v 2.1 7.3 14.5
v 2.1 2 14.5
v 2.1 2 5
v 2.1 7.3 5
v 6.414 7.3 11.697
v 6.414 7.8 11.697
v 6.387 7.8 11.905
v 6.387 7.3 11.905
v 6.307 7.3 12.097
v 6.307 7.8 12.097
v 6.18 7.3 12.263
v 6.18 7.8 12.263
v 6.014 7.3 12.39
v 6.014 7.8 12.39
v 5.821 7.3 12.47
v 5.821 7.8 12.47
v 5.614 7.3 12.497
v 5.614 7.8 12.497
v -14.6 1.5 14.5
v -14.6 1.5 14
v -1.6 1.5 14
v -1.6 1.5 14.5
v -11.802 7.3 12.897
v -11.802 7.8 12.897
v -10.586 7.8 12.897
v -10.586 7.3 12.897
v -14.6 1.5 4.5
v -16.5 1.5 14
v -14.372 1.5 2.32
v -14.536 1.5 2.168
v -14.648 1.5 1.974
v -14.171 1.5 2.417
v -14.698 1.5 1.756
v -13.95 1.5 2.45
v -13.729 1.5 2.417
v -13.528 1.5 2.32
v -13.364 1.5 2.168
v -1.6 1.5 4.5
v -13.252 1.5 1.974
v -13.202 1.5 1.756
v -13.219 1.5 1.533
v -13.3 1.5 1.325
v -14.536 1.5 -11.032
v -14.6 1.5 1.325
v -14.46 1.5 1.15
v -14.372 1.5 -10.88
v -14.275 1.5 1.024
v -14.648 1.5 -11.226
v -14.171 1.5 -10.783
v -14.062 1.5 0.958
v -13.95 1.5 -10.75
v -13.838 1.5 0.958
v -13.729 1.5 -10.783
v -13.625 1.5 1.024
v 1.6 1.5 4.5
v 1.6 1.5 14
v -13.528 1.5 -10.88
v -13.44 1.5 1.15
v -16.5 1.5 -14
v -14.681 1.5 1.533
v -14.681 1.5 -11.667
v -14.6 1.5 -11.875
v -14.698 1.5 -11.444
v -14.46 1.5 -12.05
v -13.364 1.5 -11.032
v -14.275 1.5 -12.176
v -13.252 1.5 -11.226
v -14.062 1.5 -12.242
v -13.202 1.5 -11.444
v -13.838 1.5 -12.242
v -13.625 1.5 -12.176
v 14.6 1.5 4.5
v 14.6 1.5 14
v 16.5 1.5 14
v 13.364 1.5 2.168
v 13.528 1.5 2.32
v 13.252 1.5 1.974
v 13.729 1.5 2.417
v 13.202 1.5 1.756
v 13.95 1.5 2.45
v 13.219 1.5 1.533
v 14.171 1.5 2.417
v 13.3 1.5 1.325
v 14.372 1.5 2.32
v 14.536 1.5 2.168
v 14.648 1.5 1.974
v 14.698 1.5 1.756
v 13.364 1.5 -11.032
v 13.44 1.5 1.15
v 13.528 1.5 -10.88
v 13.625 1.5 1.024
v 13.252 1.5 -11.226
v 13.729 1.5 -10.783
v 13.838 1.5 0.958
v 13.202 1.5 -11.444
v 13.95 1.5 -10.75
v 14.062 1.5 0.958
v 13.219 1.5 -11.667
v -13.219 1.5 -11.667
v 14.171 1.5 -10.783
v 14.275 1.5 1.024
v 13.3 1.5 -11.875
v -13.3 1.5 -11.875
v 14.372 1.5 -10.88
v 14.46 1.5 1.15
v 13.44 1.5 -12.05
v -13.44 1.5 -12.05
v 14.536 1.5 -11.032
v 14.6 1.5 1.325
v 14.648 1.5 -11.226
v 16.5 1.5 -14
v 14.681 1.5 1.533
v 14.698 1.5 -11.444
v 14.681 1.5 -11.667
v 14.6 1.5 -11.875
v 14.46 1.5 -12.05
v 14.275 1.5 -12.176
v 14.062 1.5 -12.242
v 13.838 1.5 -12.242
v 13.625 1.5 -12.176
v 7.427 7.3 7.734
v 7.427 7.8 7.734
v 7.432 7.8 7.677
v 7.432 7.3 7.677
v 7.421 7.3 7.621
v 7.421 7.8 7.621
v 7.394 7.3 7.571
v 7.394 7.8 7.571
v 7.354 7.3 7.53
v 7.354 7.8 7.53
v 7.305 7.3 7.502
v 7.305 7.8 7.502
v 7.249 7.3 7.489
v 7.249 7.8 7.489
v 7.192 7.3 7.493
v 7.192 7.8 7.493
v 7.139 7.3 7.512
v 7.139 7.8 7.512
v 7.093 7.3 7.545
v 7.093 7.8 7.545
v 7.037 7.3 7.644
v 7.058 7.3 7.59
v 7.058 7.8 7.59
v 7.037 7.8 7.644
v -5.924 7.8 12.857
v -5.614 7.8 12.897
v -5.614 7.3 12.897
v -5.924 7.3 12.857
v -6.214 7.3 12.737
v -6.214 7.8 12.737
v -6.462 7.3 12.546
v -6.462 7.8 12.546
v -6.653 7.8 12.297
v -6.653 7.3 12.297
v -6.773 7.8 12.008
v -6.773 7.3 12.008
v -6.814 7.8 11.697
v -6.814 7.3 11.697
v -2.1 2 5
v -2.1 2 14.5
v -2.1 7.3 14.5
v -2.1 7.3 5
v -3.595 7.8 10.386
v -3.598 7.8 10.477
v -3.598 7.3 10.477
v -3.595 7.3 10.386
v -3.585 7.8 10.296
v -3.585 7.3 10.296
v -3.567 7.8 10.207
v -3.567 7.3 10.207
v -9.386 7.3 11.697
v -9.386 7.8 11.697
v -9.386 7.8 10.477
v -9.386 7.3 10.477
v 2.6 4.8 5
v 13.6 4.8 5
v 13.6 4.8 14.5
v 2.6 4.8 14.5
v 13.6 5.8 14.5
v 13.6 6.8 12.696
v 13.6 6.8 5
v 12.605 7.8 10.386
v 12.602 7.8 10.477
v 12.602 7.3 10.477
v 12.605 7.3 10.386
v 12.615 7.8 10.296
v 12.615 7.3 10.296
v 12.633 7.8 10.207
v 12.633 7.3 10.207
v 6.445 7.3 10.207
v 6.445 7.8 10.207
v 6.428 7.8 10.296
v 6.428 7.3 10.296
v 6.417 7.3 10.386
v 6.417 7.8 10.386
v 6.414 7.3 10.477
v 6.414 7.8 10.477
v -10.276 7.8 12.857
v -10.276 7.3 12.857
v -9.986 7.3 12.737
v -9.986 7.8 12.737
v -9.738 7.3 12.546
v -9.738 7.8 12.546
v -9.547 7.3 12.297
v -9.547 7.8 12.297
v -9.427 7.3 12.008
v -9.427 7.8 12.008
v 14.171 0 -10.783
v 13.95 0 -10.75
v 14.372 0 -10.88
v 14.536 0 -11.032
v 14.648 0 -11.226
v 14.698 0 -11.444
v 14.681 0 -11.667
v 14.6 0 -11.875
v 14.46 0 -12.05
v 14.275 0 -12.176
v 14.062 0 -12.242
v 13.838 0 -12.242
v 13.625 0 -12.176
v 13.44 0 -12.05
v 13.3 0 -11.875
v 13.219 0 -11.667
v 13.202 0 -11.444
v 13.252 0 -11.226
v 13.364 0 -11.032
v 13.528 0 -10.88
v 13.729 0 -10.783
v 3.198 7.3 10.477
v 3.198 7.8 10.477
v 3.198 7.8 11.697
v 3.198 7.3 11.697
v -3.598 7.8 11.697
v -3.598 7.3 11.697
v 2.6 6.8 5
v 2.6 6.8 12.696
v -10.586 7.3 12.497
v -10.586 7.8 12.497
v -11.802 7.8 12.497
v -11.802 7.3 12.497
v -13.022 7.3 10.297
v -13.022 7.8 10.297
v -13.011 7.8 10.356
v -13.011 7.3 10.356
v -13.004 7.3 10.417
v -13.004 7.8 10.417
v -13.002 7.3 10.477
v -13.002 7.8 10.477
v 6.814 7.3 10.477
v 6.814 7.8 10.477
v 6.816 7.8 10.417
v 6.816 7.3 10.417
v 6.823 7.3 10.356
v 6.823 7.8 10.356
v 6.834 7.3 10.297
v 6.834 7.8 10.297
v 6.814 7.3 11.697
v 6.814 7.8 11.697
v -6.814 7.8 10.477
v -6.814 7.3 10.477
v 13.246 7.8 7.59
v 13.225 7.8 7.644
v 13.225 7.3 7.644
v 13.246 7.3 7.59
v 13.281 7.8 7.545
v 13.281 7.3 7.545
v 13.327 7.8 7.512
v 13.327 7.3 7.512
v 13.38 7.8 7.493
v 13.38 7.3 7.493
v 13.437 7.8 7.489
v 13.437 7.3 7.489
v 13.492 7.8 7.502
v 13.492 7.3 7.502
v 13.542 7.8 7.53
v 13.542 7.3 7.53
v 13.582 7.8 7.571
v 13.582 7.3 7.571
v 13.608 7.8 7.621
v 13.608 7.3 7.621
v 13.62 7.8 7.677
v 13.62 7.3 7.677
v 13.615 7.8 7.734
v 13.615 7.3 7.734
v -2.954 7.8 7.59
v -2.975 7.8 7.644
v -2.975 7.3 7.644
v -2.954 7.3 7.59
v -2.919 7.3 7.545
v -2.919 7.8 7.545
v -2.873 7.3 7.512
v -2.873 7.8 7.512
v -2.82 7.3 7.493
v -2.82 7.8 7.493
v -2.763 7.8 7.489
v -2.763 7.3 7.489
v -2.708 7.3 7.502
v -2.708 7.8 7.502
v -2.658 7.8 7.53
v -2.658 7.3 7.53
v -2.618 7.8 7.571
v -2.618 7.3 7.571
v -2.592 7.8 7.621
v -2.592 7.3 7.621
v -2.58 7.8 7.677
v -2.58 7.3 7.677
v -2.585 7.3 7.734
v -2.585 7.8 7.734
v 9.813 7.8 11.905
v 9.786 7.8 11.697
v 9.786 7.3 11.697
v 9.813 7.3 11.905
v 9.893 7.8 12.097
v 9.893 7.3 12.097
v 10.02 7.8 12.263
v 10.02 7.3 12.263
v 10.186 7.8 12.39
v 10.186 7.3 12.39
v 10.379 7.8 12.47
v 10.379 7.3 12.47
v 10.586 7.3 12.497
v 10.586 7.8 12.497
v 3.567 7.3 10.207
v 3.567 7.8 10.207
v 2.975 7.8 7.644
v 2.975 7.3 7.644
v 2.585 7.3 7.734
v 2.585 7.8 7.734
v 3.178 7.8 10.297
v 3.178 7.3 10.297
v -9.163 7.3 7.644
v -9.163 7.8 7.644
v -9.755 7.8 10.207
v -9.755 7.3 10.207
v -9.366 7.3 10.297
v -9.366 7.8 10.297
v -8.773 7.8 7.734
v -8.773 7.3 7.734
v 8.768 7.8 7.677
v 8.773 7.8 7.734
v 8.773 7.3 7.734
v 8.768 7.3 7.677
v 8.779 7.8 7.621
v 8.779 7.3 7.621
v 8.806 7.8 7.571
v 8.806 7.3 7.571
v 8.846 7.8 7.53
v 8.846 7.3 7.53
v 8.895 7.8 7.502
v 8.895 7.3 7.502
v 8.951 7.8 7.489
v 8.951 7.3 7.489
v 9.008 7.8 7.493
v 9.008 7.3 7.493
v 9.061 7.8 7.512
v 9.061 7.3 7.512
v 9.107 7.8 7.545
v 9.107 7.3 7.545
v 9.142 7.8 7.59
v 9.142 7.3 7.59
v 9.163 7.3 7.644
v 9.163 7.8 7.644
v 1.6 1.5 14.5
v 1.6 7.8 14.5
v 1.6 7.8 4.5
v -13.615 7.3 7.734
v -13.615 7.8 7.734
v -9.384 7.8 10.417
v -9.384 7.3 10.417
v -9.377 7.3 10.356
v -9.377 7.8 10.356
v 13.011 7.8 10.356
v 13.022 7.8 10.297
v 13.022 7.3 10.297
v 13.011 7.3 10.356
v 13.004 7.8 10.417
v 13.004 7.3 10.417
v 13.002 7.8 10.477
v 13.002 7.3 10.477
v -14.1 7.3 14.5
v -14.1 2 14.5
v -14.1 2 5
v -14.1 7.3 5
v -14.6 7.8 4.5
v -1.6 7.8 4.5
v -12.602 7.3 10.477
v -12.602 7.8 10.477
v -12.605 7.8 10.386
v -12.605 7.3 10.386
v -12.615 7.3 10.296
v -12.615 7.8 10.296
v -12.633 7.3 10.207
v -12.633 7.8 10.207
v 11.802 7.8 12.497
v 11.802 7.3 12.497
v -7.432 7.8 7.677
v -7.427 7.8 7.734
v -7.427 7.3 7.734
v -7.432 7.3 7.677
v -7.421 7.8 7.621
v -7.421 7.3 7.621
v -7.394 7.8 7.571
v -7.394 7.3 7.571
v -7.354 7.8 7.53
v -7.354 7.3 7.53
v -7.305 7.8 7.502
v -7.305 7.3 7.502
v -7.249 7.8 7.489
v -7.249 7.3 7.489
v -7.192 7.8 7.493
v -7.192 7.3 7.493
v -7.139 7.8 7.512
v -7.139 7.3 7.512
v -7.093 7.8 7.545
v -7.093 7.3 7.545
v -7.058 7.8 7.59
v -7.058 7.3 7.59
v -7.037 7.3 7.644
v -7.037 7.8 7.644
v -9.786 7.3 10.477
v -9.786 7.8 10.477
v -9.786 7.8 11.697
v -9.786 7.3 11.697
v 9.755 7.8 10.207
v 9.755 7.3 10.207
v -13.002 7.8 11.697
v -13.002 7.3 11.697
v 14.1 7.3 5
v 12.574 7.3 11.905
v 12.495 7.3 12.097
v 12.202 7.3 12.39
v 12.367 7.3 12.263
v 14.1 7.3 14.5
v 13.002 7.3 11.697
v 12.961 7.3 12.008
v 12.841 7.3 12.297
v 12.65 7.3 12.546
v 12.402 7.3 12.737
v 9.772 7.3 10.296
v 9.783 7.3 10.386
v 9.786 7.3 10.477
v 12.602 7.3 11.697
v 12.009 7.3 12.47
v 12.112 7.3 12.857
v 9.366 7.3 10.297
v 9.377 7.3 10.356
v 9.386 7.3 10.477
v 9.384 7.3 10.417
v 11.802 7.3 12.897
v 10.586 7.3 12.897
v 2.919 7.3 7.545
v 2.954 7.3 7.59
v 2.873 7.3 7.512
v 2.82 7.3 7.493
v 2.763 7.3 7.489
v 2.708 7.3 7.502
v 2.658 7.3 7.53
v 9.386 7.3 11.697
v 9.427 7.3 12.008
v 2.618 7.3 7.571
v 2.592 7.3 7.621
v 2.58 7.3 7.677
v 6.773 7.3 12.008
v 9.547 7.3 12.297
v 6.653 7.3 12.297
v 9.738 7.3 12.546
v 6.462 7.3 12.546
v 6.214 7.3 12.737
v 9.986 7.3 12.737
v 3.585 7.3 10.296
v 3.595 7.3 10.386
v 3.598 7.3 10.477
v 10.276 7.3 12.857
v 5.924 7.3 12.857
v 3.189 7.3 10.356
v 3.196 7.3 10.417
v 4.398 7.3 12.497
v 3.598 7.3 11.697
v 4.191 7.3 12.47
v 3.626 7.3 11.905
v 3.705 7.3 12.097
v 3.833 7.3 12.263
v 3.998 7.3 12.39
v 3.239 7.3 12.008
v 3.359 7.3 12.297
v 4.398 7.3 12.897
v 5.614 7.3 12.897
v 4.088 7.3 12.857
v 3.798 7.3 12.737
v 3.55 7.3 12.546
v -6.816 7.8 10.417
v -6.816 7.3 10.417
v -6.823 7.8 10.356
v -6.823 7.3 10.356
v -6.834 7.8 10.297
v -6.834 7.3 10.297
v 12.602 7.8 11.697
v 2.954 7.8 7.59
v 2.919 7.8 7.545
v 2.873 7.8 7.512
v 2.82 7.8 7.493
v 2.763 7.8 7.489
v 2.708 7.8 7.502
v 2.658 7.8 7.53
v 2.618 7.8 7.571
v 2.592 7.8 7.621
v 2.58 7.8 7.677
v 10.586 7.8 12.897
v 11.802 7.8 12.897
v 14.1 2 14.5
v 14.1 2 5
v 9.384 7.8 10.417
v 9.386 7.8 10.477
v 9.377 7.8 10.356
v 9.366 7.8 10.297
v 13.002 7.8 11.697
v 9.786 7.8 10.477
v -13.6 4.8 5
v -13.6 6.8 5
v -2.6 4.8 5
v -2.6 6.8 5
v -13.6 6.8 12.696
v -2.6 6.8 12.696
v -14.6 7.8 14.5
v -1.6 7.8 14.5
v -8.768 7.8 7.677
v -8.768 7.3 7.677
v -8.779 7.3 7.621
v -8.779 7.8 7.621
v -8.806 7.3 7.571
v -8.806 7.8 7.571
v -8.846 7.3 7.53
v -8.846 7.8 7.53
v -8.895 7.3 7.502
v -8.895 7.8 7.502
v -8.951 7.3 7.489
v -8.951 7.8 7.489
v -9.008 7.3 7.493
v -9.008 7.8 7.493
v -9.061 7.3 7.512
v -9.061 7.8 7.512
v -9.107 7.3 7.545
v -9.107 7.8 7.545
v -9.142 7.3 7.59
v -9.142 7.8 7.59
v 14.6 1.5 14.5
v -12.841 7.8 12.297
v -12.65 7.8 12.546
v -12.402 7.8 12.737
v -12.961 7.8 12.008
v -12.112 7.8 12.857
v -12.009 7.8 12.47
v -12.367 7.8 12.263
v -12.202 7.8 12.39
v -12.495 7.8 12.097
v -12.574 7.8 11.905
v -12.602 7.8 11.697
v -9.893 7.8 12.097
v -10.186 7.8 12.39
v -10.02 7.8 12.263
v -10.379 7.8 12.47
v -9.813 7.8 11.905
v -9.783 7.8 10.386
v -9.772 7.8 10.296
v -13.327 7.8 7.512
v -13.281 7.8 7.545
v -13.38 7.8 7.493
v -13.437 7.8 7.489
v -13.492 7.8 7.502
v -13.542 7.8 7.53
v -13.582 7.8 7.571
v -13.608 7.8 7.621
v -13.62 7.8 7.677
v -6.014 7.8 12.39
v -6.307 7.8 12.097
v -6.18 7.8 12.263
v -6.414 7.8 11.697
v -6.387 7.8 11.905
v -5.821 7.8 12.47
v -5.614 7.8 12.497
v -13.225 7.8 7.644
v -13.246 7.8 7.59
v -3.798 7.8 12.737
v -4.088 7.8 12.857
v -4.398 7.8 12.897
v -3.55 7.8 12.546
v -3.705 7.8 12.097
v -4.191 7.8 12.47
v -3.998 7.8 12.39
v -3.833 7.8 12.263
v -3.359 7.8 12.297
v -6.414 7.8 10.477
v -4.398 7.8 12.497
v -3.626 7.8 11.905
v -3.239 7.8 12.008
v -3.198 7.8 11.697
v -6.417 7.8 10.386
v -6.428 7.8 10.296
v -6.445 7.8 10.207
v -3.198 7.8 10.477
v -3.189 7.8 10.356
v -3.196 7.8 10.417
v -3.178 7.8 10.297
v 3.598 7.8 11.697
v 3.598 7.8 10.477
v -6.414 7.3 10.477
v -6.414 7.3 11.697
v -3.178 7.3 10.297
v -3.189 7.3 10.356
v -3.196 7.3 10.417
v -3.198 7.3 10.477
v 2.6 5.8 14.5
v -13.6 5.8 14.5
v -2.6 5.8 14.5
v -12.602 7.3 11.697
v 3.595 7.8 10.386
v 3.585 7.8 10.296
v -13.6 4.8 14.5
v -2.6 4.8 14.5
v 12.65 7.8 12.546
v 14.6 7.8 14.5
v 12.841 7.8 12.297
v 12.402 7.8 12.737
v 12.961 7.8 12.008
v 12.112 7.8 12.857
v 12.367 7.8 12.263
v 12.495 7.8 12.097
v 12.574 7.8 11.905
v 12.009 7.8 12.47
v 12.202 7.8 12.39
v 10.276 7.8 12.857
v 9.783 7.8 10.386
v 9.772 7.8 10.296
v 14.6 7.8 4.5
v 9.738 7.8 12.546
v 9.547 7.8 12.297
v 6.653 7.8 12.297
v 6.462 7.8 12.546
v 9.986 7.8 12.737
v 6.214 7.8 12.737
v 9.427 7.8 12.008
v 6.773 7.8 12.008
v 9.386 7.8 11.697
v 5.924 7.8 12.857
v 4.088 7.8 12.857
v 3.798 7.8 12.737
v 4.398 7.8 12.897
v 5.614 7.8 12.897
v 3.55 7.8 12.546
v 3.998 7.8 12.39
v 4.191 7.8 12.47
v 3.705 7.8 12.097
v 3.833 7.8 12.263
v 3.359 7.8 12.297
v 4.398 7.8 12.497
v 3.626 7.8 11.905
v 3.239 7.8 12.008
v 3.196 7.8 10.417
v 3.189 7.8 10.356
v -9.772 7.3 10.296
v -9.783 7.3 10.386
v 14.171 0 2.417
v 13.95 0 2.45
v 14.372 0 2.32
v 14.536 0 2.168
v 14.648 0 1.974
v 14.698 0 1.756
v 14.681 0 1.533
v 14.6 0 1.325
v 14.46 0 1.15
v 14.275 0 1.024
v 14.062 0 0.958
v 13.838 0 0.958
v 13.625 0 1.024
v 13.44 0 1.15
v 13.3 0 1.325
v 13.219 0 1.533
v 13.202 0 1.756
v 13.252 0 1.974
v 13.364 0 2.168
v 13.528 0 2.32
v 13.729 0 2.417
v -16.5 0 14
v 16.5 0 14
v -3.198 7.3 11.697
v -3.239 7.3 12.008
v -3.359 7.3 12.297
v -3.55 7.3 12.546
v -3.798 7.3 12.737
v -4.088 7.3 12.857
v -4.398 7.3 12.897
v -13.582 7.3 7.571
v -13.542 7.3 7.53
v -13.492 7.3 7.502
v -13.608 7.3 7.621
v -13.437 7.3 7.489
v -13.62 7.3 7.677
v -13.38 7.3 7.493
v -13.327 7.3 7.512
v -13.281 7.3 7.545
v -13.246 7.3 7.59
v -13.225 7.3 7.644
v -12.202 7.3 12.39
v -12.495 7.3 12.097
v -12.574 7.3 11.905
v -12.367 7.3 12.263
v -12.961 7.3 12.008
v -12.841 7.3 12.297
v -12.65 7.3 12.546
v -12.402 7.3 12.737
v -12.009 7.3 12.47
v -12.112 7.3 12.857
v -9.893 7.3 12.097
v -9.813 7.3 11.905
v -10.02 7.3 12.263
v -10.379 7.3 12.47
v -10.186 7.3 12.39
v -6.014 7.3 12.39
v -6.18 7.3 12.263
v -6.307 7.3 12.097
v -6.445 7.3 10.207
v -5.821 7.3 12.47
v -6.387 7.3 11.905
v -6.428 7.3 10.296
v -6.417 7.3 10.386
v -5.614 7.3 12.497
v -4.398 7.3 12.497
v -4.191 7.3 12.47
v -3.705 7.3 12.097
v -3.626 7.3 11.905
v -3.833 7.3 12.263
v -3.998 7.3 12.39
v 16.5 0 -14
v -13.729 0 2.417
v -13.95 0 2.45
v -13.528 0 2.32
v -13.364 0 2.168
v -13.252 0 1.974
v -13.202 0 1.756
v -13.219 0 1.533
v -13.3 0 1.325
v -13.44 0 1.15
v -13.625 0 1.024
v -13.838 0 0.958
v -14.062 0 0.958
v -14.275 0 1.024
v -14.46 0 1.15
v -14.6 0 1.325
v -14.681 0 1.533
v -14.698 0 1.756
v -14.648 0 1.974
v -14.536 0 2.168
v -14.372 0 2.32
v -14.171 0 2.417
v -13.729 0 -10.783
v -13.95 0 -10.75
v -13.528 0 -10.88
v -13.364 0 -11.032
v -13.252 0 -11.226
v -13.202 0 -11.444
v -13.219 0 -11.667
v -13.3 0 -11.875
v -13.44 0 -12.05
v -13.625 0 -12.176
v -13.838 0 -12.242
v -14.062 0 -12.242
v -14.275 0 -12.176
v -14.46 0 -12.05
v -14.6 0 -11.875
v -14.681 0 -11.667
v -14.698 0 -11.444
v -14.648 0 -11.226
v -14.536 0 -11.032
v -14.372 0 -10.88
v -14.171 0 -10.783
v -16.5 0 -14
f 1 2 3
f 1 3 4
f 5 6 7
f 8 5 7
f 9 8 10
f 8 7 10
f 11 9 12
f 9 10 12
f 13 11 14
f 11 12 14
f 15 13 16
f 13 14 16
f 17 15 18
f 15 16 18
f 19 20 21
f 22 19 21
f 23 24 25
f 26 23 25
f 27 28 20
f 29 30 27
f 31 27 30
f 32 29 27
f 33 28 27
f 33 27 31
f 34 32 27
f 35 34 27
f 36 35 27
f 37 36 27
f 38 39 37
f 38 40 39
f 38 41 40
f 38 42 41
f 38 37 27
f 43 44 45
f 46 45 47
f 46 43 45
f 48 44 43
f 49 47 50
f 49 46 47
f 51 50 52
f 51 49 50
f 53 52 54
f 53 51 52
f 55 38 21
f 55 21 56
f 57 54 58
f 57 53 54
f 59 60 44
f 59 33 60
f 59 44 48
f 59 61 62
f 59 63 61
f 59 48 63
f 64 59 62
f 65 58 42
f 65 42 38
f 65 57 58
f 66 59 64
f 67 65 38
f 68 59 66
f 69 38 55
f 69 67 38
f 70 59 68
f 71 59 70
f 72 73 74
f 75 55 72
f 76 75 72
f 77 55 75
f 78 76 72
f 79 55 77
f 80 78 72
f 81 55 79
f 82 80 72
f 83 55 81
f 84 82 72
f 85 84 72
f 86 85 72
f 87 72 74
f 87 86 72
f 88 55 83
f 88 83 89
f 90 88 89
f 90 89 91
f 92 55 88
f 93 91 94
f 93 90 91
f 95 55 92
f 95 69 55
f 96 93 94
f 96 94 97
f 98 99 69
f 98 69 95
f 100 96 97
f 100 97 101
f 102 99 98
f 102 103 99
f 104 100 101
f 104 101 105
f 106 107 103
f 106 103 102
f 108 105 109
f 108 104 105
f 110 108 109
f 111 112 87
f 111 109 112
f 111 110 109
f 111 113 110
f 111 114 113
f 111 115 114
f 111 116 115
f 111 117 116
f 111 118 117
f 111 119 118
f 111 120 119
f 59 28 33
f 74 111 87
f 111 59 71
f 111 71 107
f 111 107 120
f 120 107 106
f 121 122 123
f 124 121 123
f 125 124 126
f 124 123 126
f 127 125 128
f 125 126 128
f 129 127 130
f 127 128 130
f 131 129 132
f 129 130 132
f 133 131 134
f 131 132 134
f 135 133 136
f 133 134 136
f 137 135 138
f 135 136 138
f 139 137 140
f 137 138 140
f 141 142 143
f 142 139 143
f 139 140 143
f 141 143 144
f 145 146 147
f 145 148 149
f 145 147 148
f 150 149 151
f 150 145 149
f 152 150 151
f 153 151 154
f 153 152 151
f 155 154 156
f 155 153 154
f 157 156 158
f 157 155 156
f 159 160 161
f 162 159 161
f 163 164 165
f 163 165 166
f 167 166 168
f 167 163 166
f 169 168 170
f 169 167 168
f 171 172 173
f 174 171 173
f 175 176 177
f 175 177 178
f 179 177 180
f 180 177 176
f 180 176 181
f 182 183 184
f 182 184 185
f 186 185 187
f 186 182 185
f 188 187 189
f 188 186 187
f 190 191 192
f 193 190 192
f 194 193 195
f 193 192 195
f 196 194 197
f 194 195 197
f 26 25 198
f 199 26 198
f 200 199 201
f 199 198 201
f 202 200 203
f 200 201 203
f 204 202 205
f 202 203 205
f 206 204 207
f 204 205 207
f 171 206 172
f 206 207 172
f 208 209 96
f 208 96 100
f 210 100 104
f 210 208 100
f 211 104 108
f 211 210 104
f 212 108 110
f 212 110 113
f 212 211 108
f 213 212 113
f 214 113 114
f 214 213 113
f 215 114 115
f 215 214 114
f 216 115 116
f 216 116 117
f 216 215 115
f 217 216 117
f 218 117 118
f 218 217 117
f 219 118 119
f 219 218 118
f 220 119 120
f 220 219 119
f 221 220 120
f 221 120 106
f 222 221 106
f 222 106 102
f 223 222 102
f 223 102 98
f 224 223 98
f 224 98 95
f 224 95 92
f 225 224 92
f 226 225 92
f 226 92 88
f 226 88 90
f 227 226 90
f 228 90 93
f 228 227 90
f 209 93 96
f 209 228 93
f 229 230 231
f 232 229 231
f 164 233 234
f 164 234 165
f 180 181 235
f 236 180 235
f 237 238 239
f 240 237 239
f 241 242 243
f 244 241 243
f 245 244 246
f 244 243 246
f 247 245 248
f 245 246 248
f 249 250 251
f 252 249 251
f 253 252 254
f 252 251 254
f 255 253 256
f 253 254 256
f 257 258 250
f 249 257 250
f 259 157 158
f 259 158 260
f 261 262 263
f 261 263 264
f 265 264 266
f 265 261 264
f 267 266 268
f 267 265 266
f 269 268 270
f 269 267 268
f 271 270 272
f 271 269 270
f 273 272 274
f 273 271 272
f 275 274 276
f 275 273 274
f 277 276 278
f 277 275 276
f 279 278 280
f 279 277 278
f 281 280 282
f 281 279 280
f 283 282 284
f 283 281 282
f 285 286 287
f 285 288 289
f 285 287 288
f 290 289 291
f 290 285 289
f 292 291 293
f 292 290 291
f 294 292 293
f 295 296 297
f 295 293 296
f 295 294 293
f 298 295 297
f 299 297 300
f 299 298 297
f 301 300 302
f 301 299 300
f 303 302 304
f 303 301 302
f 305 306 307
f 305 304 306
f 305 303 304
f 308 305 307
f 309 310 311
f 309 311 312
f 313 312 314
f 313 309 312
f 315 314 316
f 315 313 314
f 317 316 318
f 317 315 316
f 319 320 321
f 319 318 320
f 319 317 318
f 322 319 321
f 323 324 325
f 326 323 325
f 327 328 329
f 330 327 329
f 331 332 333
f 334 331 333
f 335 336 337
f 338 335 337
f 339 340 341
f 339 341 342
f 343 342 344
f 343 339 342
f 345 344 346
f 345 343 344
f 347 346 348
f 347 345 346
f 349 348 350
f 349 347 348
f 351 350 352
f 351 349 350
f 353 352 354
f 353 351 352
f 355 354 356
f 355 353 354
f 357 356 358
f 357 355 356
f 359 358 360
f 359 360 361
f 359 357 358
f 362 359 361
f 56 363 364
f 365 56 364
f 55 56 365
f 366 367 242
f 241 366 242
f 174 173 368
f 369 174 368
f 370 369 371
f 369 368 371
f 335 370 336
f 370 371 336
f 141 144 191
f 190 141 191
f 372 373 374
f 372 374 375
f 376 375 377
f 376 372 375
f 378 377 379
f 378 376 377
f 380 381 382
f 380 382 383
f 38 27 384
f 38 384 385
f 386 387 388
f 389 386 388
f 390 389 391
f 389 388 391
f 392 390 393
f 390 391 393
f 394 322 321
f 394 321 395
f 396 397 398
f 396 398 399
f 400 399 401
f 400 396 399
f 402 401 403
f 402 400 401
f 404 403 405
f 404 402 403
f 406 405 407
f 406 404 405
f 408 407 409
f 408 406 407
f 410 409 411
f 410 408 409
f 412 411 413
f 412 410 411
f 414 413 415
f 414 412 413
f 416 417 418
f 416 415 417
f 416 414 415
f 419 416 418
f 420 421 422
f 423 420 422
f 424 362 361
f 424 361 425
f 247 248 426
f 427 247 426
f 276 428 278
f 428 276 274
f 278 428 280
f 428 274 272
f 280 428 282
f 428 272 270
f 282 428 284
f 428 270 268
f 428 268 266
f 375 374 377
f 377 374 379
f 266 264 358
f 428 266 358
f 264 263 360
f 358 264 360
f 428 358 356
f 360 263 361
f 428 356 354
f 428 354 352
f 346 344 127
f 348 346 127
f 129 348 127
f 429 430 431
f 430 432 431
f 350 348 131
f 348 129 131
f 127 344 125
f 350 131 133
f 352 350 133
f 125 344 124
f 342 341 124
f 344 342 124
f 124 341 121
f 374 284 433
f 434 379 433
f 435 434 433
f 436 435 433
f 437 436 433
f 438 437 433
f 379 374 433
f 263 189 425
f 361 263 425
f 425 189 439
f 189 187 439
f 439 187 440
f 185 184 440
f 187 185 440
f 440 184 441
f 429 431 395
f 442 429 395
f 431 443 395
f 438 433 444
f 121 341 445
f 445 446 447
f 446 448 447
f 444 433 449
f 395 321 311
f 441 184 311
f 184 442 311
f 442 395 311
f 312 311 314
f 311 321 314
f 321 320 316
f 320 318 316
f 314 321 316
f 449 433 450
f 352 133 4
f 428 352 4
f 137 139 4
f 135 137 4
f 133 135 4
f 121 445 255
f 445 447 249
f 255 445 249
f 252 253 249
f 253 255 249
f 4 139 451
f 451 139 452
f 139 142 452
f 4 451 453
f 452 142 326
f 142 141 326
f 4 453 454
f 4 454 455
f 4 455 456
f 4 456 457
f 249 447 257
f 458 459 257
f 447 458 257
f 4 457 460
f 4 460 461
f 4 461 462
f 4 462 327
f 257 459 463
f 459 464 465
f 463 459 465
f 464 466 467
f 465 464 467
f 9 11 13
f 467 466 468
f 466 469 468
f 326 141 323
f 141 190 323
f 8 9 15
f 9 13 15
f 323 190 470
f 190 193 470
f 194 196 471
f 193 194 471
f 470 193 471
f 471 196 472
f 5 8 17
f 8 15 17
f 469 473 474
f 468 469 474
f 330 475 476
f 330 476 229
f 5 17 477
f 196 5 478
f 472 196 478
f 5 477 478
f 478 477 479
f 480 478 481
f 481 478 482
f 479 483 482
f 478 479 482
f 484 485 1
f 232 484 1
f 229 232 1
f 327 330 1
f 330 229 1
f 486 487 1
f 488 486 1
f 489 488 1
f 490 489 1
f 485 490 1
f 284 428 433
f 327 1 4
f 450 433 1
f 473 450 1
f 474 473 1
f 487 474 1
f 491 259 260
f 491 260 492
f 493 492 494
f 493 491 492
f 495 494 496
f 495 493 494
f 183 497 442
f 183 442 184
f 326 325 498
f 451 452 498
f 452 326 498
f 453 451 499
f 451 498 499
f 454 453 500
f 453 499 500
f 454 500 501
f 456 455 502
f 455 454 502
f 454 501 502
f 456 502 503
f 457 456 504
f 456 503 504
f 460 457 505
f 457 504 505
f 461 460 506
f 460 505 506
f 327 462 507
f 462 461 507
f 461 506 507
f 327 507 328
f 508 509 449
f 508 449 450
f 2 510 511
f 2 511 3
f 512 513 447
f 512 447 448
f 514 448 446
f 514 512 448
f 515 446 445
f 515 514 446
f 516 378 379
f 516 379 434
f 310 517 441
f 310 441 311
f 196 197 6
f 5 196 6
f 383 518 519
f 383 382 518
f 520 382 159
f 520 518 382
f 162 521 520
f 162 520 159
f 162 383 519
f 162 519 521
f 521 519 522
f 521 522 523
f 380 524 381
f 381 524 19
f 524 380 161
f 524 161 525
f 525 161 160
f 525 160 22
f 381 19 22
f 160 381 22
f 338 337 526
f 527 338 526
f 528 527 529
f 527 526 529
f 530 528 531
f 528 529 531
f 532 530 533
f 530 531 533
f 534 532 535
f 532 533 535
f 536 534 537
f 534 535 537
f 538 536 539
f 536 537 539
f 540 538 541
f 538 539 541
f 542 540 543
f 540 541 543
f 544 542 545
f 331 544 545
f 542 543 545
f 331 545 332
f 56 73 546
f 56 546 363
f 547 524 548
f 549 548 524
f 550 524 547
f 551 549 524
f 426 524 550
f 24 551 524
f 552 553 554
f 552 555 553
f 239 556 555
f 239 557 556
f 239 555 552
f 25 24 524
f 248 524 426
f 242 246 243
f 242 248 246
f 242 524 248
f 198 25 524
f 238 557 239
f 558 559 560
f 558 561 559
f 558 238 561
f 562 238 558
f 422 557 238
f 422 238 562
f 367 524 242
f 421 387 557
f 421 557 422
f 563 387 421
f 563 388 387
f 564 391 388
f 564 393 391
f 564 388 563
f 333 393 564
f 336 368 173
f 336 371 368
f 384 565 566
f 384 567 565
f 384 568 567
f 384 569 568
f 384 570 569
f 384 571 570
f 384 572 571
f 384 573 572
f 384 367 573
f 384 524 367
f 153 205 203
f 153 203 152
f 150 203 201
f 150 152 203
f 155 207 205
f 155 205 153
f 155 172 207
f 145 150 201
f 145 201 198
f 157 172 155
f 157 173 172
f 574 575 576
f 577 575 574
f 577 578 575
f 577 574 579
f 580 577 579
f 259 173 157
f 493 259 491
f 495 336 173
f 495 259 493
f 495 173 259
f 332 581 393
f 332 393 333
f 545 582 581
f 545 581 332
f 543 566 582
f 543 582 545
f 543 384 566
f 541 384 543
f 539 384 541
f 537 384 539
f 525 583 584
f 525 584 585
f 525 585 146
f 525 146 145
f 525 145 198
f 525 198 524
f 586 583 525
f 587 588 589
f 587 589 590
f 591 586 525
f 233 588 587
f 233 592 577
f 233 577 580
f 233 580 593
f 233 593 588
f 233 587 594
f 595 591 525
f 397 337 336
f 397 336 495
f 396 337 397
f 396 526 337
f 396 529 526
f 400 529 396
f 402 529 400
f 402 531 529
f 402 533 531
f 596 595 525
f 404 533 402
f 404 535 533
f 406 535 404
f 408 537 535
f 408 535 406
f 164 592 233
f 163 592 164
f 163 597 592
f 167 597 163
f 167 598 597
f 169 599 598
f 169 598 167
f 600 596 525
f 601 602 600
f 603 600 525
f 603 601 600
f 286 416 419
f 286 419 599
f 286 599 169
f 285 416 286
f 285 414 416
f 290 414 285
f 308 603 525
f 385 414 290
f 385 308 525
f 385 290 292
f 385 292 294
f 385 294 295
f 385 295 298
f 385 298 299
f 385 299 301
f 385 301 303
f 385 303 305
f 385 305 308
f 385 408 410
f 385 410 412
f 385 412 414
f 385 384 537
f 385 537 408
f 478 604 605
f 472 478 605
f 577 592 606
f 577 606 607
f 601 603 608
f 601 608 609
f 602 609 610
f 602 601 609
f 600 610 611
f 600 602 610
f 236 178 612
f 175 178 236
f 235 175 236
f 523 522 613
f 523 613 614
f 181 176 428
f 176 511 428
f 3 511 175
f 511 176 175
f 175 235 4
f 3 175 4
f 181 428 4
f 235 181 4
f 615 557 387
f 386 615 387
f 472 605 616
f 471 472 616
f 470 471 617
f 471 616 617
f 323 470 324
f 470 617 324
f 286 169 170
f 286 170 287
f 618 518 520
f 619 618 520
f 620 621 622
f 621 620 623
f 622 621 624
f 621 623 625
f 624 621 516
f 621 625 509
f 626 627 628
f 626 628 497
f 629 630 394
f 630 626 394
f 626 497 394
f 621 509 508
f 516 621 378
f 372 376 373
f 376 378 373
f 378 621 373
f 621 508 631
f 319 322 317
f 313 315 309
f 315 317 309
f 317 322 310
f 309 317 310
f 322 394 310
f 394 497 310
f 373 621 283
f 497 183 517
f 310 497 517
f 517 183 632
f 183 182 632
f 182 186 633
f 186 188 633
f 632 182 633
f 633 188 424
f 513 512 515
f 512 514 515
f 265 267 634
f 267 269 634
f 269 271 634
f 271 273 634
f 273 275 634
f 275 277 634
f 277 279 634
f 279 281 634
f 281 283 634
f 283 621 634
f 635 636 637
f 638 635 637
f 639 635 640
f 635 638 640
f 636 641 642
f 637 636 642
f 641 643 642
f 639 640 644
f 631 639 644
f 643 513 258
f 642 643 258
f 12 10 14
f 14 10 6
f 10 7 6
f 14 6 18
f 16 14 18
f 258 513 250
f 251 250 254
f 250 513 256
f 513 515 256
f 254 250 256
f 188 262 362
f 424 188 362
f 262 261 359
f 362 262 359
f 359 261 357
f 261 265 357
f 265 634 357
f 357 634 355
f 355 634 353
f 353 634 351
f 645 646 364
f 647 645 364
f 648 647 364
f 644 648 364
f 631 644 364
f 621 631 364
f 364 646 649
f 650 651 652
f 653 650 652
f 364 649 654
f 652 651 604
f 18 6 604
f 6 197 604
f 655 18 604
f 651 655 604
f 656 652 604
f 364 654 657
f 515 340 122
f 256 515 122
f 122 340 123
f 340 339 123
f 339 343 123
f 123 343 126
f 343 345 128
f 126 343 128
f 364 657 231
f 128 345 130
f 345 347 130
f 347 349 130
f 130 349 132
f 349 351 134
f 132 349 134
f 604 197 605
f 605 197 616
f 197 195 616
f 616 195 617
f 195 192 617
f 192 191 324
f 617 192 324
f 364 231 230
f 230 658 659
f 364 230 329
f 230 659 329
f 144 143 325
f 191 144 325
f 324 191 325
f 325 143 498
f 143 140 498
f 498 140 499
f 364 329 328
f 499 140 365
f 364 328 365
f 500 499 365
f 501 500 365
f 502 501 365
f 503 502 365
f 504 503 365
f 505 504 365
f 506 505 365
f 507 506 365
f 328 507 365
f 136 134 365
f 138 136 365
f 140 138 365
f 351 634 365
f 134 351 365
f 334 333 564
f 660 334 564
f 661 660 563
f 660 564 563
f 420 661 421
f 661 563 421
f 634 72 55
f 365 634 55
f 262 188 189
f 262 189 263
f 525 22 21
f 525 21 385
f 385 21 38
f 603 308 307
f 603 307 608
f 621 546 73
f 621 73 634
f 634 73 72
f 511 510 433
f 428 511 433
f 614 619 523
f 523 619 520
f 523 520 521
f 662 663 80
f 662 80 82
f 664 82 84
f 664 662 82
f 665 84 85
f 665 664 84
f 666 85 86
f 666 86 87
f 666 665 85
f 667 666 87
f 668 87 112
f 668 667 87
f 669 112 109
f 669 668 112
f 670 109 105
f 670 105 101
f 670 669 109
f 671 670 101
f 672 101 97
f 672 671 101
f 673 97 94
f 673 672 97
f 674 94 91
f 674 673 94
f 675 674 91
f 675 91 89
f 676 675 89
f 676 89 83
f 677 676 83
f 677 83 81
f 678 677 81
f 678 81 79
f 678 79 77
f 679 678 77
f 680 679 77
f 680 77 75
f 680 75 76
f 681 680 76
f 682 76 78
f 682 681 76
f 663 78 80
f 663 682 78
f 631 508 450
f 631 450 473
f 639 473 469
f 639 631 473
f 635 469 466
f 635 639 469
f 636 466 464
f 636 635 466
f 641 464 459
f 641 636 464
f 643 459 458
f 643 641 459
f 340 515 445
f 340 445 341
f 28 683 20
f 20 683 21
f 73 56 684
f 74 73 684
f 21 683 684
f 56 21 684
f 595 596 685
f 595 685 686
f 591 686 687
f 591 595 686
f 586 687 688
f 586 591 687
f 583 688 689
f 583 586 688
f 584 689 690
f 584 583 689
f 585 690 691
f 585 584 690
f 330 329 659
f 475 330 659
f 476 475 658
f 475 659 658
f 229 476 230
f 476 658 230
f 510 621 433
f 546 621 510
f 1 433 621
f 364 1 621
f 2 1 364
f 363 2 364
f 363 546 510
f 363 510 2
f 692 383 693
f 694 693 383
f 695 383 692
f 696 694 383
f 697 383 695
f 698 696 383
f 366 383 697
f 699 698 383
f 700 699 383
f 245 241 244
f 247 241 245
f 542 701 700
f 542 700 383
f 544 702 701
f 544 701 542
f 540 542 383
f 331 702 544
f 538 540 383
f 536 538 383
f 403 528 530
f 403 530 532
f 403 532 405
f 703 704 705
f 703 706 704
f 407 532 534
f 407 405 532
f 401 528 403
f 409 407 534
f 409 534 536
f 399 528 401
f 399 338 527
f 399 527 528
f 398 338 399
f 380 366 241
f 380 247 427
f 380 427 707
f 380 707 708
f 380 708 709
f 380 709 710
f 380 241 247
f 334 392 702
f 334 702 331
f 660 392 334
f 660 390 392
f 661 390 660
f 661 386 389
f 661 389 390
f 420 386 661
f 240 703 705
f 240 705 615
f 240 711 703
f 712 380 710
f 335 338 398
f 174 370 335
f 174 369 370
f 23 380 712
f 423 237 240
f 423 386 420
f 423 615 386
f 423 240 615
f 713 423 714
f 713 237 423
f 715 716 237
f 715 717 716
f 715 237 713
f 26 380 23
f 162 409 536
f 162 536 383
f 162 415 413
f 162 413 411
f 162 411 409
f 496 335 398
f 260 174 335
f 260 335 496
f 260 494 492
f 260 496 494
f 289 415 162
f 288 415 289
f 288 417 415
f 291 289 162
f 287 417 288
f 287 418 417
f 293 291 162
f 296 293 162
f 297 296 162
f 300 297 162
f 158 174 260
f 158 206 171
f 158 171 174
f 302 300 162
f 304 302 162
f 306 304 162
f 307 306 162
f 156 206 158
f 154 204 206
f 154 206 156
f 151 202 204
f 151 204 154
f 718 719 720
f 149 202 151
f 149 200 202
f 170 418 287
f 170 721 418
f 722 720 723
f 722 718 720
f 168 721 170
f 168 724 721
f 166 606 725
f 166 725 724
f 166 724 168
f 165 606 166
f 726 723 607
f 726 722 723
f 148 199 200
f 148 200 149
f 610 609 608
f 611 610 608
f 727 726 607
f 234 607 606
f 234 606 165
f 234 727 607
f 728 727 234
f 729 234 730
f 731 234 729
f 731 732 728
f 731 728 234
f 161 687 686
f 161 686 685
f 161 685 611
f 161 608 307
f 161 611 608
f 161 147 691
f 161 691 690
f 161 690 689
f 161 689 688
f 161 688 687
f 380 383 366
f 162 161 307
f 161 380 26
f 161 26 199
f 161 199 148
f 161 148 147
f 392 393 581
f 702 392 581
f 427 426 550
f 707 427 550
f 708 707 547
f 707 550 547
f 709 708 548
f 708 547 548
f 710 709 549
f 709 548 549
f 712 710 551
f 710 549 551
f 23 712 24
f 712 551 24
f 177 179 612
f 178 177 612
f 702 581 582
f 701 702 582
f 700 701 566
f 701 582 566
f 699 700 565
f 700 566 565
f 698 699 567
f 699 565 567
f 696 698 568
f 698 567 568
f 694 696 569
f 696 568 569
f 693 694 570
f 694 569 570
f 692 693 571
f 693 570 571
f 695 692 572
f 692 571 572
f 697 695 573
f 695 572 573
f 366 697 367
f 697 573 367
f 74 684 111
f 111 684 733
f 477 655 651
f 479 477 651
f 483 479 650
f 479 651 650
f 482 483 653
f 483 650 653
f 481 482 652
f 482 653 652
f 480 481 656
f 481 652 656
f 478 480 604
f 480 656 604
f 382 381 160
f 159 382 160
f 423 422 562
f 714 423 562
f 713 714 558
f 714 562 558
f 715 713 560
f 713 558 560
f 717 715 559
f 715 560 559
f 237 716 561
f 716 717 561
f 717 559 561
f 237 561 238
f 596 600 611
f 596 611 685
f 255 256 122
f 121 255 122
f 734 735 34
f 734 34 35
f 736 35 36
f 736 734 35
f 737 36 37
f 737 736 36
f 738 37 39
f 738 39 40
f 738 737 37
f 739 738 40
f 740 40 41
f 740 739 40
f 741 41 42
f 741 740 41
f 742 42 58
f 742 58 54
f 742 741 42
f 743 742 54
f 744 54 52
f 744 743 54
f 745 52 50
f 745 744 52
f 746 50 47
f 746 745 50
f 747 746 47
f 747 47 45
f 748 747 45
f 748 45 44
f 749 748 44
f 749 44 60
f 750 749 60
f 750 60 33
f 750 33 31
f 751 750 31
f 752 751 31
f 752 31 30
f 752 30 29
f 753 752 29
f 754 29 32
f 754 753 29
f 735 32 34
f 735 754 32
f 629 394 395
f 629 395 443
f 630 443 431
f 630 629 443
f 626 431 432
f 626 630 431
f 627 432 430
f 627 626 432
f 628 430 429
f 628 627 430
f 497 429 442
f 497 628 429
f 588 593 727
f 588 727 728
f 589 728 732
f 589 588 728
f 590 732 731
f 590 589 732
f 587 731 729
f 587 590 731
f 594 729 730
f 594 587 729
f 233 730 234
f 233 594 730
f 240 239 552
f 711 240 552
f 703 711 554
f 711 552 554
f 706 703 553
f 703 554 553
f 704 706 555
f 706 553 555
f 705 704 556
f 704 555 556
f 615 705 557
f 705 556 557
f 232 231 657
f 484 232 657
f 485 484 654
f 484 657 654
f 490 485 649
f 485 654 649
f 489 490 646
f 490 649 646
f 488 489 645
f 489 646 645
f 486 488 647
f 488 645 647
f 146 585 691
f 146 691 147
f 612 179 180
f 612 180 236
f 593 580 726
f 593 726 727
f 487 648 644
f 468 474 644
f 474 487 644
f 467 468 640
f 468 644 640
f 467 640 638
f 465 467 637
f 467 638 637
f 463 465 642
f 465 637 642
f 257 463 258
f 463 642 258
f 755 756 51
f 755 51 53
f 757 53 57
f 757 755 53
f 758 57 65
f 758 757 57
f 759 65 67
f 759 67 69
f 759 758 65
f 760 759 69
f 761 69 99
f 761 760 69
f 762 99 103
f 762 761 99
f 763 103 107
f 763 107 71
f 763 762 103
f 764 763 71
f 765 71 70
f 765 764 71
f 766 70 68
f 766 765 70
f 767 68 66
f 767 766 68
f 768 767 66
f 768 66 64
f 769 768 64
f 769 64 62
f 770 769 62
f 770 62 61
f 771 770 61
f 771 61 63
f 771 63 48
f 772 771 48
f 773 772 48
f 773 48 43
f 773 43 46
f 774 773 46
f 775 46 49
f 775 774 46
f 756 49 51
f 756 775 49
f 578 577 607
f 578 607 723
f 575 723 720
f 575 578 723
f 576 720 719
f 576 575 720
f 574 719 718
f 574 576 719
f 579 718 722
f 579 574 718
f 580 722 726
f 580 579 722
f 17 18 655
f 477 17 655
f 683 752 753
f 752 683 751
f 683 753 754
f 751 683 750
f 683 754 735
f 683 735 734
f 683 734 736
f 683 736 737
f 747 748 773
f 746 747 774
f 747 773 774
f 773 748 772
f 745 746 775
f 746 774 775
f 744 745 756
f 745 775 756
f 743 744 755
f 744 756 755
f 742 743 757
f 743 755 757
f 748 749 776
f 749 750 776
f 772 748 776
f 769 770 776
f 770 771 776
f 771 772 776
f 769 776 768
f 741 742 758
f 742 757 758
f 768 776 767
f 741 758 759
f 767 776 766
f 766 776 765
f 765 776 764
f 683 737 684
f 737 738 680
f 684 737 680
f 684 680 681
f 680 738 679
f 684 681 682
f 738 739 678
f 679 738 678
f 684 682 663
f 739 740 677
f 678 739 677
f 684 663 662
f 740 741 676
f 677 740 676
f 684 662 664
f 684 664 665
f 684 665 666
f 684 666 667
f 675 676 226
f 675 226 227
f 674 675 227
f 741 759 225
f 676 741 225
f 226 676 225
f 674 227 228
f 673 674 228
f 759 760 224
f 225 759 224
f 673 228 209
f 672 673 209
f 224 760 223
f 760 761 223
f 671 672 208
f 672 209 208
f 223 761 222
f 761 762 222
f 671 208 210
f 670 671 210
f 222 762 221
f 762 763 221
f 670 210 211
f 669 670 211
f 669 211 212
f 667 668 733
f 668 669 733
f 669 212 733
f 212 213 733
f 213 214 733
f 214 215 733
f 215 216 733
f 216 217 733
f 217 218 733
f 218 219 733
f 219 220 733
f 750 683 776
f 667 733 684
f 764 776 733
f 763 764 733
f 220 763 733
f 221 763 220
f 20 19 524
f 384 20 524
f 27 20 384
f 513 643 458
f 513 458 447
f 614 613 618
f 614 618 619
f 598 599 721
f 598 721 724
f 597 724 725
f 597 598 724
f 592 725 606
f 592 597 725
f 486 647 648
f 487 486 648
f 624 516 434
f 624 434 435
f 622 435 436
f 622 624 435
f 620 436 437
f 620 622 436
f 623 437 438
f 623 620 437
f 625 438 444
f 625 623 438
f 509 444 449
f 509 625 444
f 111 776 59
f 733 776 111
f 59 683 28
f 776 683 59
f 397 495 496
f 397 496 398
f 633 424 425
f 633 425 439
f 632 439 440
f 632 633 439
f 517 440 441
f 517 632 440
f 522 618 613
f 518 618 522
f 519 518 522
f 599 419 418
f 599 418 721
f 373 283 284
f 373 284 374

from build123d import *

# Parameters (mm, degrees)
SKETCH1_W                 = 33
SKETCH1_H                 = 28
SKETCH1_R                 = 0.75
BOSS_EXTRUDE1_DEPTH       = 1.5
SKETCH2_W                 = 13
SKETCH2_H                 = 10
BOSS_EXTRUDE2_DEPTH       = 6.3
SKETCH3_W                 = 12
SKETCH3_H                 = 5.3
CUT_EXTRUDE1_DEPTH        = 9.5
CUT_EXTRUDE2_REACH        = 25.31
SKETCH5_W                 = 11
SKETCH5_H                 = 2
BOSS_EXTRUDE3_DEPTH       = 9.5
CHAMFER1_SIZE             = 1
CHAMFER1_SIZE2            = 1.804047755
CHAMFER1_OF_MIRROR4_SIZE2 = 1
CHAMFER1_OF_MIRROR4_SIZE  = 1.804047755


with BuildPart() as part:
    # Sketch1 → Boss-Extrude1 (new body)
    with BuildSketch(Plane(origin=(0, 0, 0), x_dir=(1, 0, 0), z_dir=(0, 1, 0))):
        Rectangle(SKETCH1_W, SKETCH1_H)
        with Locations(Location((-13.95, 11.5, 0), (0, 0, 270))):
            Circle(SKETCH1_R, mode=Mode.SUBTRACT)
        with Locations(Location((13.95, 11.5, 0), (0, 0, 270))):
            Circle(SKETCH1_R, mode=Mode.SUBTRACT)
        with Locations(Location((13.95, -1.7, 0), (0, 0, 270))):
            Circle(SKETCH1_R, mode=Mode.SUBTRACT)
        with Locations(Location((-13.95, -1.7, 0), (0, 0, 270))):
            Circle(SKETCH1_R, mode=Mode.SUBTRACT)
    extrude(amount=BOSS_EXTRUDE1_DEPTH)

    # Sketch2 → Boss-Extrude2 (add)
    with BuildSketch(Plane(origin=(0, 1.5, 0), x_dir=(1, 0, 0), z_dir=(0, 1, 0))):
        with Locations((-8.1, -9.5)):
            Rectangle(SKETCH2_W, SKETCH2_H)
    boss_extrude2 = extrude(amount=BOSS_EXTRUDE2_DEPTH)

    # Sketch3 → Cut-Extrude1 (cut)
    with BuildSketch(Plane.XY.offset(14.5)):
        with Locations((-8.1, 4.65)):
            Rectangle(SKETCH3_W, SKETCH3_H)
    cut_extrude1 = extrude(amount=-CUT_EXTRUDE1_DEPTH, mode=Mode.SUBTRACT)

    # Sketch4 → Cut-Extrude2 (cut, up to next)
    with BuildSketch(Plane(origin=(0, 7.8, 0), x_dir=(1, 0, 0), z_dir=(0, 1, 0)), mode=Mode.PRIVATE) as cut_extrude2_sk1:
        with BuildLine():
            Line((-13.614934874, -7.733680754), (-13.022262005, -10.296990911))
            ThreePointArc((-13.022262005, -10.296990911), (-13.006856344, -10.386514555), (-13.001698958, -10.477207547))
            Line((-13.001698958, -10.477207547), (-13.001698958, -11.69747768))
            ThreePointArc((-13.001698958, -11.69747768), (-12.650227096, -12.546005817), (-11.801698958, -12.89747768))
            Line((-11.801698958, -12.89747768), (-10.586140238, -12.89747768))
            ThreePointArc((-10.586140238, -12.89747768), (-9.7376121, -12.546005817), (-9.386140238, -11.69747768))
            Line((-9.386140238, -11.69747768), (-9.386140238, -10.477207547))
            ThreePointArc((-9.386140238, -10.477207547), (-9.380982852, -10.386514555), (-9.365577191, -10.296990911))
            Line((-9.365577191, -10.296990911), (-8.772904322, -7.733680754))
            ThreePointArc((-8.772904322, -7.733680754), (-8.922709401, -7.493767357), (-9.162622799, -7.643572436))
            Line((-9.162622799, -7.643572436), (-9.755295667, -10.206882592))
            ThreePointArc((-9.755295667, -10.206882592), (-9.778404159, -10.34116806), (-9.786140238, -10.477207547))
            Line((-9.786140238, -10.477207547), (-9.786140238, -11.69747768))
            ThreePointArc((-9.786140238, -11.69747768), (-10.020454813, -12.263163104), (-10.586140238, -12.49747768))
            Line((-10.586140238, -12.49747768), (-11.801698958, -12.49747768))
            ThreePointArc((-11.801698958, -12.49747768), (-12.367384383, -12.263163104), (-12.601698958, -11.69747768))
            Line((-12.601698958, -11.69747768), (-12.601698958, -10.477207547))
            ThreePointArc((-12.601698958, -10.477207547), (-12.609435037, -10.34116806), (-12.632543529, -10.206882592))
            Line((-12.632543529, -10.206882592), (-13.225216397, -7.643572436))
            ThreePointArc((-13.225216397, -7.643572436), (-13.465129794, -7.493767357), (-13.614934874, -7.733680754))
        make_face()
    cut_extrude2_tool1 = extrude(cut_extrude2_sk1.sketch, amount=-CUT_EXTRUDE2_REACH, mode=Mode.PRIVATE) & part.part
    # Sketch4 → Cut-Extrude2 (cut, up to next)
    with BuildSketch(Plane(origin=(0, 7.8, 0), x_dir=(1, 0, 0), z_dir=(0, 1, 0)), mode=Mode.PRIVATE) as cut_extrude2_sk2:
        with BuildLine():
            Line((-7.037377201, -7.643572436), (-6.444704333, -10.206882592))
            ThreePointArc((-6.444704333, -10.206882592), (-6.421595841, -10.34116806), (-6.413859762, -10.477207547))
            Line((-6.413859762, -10.477207547), (-6.413859762, -11.69747768))
            ThreePointArc((-6.413859762, -11.69747768), (-6.179545187, -12.263163104), (-5.613859762, -12.49747768))
            Line((-5.613859762, -12.49747768), (-4.398301042, -12.49747768))
            ThreePointArc((-4.398301042, -12.49747768), (-3.832615617, -12.263163104), (-3.598301042, -11.69747768))
            Line((-3.598301042, -11.69747768), (-3.598301042, -10.477207547))
            ThreePointArc((-3.598301042, -10.477207547), (-3.590564963, -10.34116806), (-3.567456471, -10.206882592))
            Line((-3.567456471, -10.206882592), (-2.974783603, -7.643572436))
            ThreePointArc((-2.974783603, -7.643572436), (-2.734870206, -7.493767357), (-2.585065126, -7.733680754))
            Line((-2.585065126, -7.733680754), (-3.177737995, -10.296990911))
            ThreePointArc((-3.177737995, -10.296990911), (-3.193143656, -10.386514555), (-3.198301042, -10.477207547))
            Line((-3.198301042, -10.477207547), (-3.198301042, -11.69747768))
            ThreePointArc((-3.198301042, -11.69747768), (-3.549772904, -12.546005817), (-4.398301042, -12.89747768))
            Line((-4.398301042, -12.89747768), (-5.613859762, -12.89747768))
            ThreePointArc((-5.613859762, -12.89747768), (-6.4623879, -12.546005817), (-6.813859762, -11.69747768))
            Line((-6.813859762, -11.69747768), (-6.813859762, -10.477207547))
            ThreePointArc((-6.813859762, -10.477207547), (-6.819017148, -10.386514555), (-6.834422809, -10.296990911))
            Line((-6.834422809, -10.296990911), (-7.427095678, -7.733680754))
            ThreePointArc((-7.427095678, -7.733680754), (-7.277290599, -7.493767357), (-7.037377201, -7.643572436))
        make_face()
    cut_extrude2_tool2 = extrude(cut_extrude2_sk2.sketch, amount=-CUT_EXTRUDE2_REACH, mode=Mode.PRIVATE) & part.part
    cut_extrude2_1 = cut_extrude2_tool1.solids().sort_by_distance((-13.247802, 7.8, 8.998967))[0]
    add(cut_extrude2_1, mode=Mode.SUBTRACT)
    cut_extrude2_2 = cut_extrude2_tool2.solids().sort_by_distance((-6.741196, 7.8, 11.087343))[0]
    add(cut_extrude2_2, mode=Mode.SUBTRACT)
    cut_extrude2 = cut_extrude2_1 + cut_extrude2_2  # Cut-Extrude2 as one shape, for the pattern or mirror that repeats it

    # Sketch5 → Boss-Extrude3 (add)
    with BuildSketch(Plane.XY.offset(5)):
        with Locations((-8.1, 5.8)):
            Rectangle(SKETCH5_W, SKETCH5_H)
    boss_extrude3 = extrude(amount=BOSS_EXTRUDE3_DEPTH)

    # Chamfer1
    chamfer1_edges = [part.edges().sort_by_distance(p)[0] for p in [
        (-8.1, 6.8, 14.5),
    ]]
    chamfer1_side = [part.faces().sort_by_distance(p)[0] for p in [
        (-8.1, 5.8, 14.5),
    ]]
    chamfer(chamfer1_edges, length=CHAMFER1_SIZE, length2=CHAMFER1_SIZE2, reference=chamfer1_side[0])

    # Mirror4: Boss-Extrude2, Cut-Extrude1, Cut-Extrude2, Boss-Extrude3 across plane
    add(boss_extrude2.mirror(Plane(origin=(0, 0, 0), x_dir=(0, 0, 1), z_dir=(1, 0, 0))))
    add(cut_extrude1.mirror(Plane(origin=(0, 0, 0), x_dir=(0, 0, 1), z_dir=(1, 0, 0))), mode=Mode.SUBTRACT)
    add(cut_extrude2.mirror(Plane(origin=(0, 0, 0), x_dir=(0, 0, 1), z_dir=(1, 0, 0))), mode=Mode.SUBTRACT)
    add(boss_extrude3.mirror(Plane(origin=(0, 0, 0), x_dir=(0, 0, 1), z_dir=(1, 0, 0))))

    # Chamfer1 of Mirror4
    chamfer1_of_mirror4_edges = [part.edges().sort_by_distance(p)[0] for p in [
        (8.1, 6.8, 14.5),
    ]]
    chamfer(chamfer1_of_mirror4_edges, length=CHAMFER1_OF_MIRROR4_SIZE, length2=CHAMFER1_OF_MIRROR4_SIZE2)


solid = part.part
